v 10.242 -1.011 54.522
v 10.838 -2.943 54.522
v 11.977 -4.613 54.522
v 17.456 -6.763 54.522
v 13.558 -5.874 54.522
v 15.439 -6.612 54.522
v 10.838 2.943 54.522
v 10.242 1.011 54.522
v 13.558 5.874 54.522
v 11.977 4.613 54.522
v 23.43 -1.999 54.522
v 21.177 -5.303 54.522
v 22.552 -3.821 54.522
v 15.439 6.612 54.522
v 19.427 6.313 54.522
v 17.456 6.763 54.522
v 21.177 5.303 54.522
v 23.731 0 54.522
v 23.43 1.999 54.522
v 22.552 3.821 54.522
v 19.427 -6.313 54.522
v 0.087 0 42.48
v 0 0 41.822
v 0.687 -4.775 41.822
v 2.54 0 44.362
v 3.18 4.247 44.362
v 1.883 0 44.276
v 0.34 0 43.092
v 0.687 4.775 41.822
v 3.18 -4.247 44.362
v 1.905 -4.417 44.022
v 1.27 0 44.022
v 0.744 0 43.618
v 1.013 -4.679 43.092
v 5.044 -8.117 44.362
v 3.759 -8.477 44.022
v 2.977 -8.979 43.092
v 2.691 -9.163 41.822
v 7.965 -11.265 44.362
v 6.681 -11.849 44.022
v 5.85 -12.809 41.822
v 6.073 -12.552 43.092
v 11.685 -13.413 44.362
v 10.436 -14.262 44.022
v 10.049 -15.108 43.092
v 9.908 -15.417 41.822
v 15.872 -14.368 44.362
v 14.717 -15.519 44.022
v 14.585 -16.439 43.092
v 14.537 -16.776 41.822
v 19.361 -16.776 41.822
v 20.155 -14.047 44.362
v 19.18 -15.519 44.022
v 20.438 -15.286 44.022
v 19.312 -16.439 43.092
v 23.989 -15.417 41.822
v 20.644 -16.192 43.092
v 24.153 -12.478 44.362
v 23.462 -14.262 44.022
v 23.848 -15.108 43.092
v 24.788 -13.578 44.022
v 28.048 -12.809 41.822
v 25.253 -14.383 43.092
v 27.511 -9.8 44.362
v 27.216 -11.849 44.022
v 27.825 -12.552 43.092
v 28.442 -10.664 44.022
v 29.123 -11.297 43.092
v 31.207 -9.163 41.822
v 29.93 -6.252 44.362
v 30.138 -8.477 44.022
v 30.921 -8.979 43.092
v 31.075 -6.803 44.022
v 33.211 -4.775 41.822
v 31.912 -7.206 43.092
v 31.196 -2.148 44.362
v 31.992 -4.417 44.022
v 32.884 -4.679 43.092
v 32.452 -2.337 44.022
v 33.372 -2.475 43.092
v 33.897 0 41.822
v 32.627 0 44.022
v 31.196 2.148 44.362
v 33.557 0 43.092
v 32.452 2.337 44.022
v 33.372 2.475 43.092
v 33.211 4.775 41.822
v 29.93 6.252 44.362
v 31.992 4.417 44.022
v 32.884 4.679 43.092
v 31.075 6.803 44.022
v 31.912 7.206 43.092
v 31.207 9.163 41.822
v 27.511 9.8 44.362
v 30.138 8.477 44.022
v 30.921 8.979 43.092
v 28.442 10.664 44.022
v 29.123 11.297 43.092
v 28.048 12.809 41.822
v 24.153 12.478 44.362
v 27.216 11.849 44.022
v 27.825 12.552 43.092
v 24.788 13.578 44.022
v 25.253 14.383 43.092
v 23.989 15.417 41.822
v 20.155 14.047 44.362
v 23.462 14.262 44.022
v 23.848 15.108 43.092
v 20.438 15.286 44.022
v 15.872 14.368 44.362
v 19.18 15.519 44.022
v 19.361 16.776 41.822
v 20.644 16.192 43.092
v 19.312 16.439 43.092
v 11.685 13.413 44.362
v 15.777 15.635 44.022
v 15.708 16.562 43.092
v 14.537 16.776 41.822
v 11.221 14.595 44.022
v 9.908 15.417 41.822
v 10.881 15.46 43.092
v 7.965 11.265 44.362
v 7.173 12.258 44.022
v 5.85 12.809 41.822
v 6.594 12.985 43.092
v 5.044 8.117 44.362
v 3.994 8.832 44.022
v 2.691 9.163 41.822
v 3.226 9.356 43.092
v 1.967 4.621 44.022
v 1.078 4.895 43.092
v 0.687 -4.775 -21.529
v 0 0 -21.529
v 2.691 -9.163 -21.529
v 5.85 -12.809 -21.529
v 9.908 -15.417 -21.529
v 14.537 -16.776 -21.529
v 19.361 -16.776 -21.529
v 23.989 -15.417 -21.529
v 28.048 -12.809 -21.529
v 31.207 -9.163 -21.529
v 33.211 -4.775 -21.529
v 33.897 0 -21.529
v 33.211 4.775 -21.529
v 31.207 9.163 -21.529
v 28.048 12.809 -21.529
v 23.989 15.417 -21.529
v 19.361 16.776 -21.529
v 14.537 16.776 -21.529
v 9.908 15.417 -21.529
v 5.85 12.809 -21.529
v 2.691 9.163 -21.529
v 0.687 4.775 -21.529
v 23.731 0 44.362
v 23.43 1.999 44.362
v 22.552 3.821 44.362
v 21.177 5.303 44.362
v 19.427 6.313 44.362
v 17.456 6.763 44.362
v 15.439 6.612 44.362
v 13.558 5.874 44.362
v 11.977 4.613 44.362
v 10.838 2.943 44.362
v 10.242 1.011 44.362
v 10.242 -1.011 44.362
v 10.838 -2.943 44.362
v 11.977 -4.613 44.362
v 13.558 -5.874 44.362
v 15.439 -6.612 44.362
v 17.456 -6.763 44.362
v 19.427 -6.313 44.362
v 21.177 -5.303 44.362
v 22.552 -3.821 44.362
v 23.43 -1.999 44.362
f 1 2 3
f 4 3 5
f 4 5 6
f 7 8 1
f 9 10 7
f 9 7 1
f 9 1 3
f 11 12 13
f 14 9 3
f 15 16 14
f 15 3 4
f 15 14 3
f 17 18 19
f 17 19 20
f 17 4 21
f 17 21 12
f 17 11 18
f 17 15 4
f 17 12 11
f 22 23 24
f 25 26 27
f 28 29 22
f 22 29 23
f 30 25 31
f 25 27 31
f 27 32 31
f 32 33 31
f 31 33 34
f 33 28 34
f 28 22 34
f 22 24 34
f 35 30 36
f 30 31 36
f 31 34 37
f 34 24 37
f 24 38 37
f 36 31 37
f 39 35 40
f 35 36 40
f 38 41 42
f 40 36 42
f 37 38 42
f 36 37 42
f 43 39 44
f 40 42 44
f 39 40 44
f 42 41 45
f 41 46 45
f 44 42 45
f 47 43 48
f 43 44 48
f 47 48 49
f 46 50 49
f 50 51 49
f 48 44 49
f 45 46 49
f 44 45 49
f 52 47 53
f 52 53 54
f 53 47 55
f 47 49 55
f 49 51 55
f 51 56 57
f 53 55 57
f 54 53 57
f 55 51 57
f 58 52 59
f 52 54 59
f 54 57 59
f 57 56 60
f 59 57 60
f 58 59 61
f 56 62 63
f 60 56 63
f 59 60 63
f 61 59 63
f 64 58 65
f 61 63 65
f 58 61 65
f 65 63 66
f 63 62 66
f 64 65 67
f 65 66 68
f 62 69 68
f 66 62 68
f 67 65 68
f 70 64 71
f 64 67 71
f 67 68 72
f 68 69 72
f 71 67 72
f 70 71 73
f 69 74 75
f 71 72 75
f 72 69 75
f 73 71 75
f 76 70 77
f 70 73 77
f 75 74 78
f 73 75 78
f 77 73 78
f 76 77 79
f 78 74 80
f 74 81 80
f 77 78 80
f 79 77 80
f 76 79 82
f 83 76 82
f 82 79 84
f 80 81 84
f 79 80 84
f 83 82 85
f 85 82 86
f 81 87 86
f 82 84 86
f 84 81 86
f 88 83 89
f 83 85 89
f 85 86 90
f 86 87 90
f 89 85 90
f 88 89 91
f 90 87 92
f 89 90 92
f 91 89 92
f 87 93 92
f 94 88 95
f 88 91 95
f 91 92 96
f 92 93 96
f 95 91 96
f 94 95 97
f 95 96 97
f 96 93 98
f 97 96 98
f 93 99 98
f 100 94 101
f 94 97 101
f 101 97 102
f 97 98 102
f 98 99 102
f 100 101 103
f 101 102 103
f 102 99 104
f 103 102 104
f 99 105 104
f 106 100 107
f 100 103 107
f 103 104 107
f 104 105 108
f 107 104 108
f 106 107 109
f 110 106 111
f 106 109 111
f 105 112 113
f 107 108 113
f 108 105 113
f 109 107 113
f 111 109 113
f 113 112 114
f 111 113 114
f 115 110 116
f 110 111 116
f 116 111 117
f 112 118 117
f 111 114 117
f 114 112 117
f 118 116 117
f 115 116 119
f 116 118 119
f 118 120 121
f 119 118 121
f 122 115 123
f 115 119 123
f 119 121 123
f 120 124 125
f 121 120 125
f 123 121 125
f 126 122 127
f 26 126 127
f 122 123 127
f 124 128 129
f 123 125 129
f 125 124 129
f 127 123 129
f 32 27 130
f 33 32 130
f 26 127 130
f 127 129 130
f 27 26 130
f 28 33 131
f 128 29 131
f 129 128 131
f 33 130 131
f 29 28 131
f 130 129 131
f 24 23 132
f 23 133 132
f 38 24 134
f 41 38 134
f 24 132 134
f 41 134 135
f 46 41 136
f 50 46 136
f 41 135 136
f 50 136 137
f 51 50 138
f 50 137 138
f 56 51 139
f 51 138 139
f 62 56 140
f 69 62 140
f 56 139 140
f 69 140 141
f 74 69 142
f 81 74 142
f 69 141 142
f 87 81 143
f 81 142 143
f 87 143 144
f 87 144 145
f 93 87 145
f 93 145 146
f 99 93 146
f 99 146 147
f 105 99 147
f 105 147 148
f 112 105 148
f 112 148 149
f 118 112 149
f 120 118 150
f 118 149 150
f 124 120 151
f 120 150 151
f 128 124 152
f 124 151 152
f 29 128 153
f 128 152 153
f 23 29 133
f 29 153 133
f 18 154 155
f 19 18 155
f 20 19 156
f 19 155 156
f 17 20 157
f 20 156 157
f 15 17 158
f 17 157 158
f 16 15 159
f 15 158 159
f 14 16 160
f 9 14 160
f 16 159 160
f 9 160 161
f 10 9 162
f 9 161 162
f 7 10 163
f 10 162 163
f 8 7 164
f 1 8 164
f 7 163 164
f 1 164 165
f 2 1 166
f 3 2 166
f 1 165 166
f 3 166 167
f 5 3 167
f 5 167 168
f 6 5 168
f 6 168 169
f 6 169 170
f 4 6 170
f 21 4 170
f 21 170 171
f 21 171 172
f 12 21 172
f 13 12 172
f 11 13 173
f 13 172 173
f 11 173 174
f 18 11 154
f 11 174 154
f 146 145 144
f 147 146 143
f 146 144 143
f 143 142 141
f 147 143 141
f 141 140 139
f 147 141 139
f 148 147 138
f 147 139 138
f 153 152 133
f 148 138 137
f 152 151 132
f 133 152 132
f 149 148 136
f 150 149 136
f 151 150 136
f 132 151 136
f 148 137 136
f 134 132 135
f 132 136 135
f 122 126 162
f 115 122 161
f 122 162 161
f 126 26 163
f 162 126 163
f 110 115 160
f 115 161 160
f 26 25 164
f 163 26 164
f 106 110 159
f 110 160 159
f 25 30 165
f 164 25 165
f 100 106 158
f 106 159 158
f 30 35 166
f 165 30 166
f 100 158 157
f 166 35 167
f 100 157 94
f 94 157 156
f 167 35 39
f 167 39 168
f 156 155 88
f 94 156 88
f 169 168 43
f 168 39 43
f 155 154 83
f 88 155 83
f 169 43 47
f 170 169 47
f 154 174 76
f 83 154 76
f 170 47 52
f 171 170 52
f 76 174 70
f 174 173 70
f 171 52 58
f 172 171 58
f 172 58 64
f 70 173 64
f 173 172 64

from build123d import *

# Parameters (mm, degrees)
F2_R     = 6.782292
F3_DEPTH = 10.16
F4_R     = 4.804255
F5_DEPTH = 4


with BuildPart() as f1:
    # F0 (on Front) → F1 (revolve)
    with BuildSketch(Plane.XZ):
        with BuildLine():
            Line((0, 41.822274), (0, -21.52941))
            Line((0, -21.52941), (16.948683, -21.52941))
            Line((16.948683, -21.52941), (16.948683, 44.362274))
            Line((16.948683, 44.362274), (2.54, 44.362274))
            ThreePointArc((2.54, 44.362274), (0.743949, 43.618325), (0, 41.822274))
        make_face()
    revolve(axis=Axis((16.948683, 0, 11.416432), (0, 0, 1)))

    # F2 (on face) → F3 (join)
    with BuildSketch(Plane.XY.offset(44.362274)):
        with Locations((16.948683, 0)):
            Circle(F2_R)
    extrude(amount=F3_DEPTH)

    # F4 (on face) → F5 (join)
    with BuildSketch(Plane.XY.offset(54.522274)):
        with Locations((16.948683, 0)):
            Circle(F4_R)
    extrude(amount=-F5_DEPTH)


solid = f1.part
